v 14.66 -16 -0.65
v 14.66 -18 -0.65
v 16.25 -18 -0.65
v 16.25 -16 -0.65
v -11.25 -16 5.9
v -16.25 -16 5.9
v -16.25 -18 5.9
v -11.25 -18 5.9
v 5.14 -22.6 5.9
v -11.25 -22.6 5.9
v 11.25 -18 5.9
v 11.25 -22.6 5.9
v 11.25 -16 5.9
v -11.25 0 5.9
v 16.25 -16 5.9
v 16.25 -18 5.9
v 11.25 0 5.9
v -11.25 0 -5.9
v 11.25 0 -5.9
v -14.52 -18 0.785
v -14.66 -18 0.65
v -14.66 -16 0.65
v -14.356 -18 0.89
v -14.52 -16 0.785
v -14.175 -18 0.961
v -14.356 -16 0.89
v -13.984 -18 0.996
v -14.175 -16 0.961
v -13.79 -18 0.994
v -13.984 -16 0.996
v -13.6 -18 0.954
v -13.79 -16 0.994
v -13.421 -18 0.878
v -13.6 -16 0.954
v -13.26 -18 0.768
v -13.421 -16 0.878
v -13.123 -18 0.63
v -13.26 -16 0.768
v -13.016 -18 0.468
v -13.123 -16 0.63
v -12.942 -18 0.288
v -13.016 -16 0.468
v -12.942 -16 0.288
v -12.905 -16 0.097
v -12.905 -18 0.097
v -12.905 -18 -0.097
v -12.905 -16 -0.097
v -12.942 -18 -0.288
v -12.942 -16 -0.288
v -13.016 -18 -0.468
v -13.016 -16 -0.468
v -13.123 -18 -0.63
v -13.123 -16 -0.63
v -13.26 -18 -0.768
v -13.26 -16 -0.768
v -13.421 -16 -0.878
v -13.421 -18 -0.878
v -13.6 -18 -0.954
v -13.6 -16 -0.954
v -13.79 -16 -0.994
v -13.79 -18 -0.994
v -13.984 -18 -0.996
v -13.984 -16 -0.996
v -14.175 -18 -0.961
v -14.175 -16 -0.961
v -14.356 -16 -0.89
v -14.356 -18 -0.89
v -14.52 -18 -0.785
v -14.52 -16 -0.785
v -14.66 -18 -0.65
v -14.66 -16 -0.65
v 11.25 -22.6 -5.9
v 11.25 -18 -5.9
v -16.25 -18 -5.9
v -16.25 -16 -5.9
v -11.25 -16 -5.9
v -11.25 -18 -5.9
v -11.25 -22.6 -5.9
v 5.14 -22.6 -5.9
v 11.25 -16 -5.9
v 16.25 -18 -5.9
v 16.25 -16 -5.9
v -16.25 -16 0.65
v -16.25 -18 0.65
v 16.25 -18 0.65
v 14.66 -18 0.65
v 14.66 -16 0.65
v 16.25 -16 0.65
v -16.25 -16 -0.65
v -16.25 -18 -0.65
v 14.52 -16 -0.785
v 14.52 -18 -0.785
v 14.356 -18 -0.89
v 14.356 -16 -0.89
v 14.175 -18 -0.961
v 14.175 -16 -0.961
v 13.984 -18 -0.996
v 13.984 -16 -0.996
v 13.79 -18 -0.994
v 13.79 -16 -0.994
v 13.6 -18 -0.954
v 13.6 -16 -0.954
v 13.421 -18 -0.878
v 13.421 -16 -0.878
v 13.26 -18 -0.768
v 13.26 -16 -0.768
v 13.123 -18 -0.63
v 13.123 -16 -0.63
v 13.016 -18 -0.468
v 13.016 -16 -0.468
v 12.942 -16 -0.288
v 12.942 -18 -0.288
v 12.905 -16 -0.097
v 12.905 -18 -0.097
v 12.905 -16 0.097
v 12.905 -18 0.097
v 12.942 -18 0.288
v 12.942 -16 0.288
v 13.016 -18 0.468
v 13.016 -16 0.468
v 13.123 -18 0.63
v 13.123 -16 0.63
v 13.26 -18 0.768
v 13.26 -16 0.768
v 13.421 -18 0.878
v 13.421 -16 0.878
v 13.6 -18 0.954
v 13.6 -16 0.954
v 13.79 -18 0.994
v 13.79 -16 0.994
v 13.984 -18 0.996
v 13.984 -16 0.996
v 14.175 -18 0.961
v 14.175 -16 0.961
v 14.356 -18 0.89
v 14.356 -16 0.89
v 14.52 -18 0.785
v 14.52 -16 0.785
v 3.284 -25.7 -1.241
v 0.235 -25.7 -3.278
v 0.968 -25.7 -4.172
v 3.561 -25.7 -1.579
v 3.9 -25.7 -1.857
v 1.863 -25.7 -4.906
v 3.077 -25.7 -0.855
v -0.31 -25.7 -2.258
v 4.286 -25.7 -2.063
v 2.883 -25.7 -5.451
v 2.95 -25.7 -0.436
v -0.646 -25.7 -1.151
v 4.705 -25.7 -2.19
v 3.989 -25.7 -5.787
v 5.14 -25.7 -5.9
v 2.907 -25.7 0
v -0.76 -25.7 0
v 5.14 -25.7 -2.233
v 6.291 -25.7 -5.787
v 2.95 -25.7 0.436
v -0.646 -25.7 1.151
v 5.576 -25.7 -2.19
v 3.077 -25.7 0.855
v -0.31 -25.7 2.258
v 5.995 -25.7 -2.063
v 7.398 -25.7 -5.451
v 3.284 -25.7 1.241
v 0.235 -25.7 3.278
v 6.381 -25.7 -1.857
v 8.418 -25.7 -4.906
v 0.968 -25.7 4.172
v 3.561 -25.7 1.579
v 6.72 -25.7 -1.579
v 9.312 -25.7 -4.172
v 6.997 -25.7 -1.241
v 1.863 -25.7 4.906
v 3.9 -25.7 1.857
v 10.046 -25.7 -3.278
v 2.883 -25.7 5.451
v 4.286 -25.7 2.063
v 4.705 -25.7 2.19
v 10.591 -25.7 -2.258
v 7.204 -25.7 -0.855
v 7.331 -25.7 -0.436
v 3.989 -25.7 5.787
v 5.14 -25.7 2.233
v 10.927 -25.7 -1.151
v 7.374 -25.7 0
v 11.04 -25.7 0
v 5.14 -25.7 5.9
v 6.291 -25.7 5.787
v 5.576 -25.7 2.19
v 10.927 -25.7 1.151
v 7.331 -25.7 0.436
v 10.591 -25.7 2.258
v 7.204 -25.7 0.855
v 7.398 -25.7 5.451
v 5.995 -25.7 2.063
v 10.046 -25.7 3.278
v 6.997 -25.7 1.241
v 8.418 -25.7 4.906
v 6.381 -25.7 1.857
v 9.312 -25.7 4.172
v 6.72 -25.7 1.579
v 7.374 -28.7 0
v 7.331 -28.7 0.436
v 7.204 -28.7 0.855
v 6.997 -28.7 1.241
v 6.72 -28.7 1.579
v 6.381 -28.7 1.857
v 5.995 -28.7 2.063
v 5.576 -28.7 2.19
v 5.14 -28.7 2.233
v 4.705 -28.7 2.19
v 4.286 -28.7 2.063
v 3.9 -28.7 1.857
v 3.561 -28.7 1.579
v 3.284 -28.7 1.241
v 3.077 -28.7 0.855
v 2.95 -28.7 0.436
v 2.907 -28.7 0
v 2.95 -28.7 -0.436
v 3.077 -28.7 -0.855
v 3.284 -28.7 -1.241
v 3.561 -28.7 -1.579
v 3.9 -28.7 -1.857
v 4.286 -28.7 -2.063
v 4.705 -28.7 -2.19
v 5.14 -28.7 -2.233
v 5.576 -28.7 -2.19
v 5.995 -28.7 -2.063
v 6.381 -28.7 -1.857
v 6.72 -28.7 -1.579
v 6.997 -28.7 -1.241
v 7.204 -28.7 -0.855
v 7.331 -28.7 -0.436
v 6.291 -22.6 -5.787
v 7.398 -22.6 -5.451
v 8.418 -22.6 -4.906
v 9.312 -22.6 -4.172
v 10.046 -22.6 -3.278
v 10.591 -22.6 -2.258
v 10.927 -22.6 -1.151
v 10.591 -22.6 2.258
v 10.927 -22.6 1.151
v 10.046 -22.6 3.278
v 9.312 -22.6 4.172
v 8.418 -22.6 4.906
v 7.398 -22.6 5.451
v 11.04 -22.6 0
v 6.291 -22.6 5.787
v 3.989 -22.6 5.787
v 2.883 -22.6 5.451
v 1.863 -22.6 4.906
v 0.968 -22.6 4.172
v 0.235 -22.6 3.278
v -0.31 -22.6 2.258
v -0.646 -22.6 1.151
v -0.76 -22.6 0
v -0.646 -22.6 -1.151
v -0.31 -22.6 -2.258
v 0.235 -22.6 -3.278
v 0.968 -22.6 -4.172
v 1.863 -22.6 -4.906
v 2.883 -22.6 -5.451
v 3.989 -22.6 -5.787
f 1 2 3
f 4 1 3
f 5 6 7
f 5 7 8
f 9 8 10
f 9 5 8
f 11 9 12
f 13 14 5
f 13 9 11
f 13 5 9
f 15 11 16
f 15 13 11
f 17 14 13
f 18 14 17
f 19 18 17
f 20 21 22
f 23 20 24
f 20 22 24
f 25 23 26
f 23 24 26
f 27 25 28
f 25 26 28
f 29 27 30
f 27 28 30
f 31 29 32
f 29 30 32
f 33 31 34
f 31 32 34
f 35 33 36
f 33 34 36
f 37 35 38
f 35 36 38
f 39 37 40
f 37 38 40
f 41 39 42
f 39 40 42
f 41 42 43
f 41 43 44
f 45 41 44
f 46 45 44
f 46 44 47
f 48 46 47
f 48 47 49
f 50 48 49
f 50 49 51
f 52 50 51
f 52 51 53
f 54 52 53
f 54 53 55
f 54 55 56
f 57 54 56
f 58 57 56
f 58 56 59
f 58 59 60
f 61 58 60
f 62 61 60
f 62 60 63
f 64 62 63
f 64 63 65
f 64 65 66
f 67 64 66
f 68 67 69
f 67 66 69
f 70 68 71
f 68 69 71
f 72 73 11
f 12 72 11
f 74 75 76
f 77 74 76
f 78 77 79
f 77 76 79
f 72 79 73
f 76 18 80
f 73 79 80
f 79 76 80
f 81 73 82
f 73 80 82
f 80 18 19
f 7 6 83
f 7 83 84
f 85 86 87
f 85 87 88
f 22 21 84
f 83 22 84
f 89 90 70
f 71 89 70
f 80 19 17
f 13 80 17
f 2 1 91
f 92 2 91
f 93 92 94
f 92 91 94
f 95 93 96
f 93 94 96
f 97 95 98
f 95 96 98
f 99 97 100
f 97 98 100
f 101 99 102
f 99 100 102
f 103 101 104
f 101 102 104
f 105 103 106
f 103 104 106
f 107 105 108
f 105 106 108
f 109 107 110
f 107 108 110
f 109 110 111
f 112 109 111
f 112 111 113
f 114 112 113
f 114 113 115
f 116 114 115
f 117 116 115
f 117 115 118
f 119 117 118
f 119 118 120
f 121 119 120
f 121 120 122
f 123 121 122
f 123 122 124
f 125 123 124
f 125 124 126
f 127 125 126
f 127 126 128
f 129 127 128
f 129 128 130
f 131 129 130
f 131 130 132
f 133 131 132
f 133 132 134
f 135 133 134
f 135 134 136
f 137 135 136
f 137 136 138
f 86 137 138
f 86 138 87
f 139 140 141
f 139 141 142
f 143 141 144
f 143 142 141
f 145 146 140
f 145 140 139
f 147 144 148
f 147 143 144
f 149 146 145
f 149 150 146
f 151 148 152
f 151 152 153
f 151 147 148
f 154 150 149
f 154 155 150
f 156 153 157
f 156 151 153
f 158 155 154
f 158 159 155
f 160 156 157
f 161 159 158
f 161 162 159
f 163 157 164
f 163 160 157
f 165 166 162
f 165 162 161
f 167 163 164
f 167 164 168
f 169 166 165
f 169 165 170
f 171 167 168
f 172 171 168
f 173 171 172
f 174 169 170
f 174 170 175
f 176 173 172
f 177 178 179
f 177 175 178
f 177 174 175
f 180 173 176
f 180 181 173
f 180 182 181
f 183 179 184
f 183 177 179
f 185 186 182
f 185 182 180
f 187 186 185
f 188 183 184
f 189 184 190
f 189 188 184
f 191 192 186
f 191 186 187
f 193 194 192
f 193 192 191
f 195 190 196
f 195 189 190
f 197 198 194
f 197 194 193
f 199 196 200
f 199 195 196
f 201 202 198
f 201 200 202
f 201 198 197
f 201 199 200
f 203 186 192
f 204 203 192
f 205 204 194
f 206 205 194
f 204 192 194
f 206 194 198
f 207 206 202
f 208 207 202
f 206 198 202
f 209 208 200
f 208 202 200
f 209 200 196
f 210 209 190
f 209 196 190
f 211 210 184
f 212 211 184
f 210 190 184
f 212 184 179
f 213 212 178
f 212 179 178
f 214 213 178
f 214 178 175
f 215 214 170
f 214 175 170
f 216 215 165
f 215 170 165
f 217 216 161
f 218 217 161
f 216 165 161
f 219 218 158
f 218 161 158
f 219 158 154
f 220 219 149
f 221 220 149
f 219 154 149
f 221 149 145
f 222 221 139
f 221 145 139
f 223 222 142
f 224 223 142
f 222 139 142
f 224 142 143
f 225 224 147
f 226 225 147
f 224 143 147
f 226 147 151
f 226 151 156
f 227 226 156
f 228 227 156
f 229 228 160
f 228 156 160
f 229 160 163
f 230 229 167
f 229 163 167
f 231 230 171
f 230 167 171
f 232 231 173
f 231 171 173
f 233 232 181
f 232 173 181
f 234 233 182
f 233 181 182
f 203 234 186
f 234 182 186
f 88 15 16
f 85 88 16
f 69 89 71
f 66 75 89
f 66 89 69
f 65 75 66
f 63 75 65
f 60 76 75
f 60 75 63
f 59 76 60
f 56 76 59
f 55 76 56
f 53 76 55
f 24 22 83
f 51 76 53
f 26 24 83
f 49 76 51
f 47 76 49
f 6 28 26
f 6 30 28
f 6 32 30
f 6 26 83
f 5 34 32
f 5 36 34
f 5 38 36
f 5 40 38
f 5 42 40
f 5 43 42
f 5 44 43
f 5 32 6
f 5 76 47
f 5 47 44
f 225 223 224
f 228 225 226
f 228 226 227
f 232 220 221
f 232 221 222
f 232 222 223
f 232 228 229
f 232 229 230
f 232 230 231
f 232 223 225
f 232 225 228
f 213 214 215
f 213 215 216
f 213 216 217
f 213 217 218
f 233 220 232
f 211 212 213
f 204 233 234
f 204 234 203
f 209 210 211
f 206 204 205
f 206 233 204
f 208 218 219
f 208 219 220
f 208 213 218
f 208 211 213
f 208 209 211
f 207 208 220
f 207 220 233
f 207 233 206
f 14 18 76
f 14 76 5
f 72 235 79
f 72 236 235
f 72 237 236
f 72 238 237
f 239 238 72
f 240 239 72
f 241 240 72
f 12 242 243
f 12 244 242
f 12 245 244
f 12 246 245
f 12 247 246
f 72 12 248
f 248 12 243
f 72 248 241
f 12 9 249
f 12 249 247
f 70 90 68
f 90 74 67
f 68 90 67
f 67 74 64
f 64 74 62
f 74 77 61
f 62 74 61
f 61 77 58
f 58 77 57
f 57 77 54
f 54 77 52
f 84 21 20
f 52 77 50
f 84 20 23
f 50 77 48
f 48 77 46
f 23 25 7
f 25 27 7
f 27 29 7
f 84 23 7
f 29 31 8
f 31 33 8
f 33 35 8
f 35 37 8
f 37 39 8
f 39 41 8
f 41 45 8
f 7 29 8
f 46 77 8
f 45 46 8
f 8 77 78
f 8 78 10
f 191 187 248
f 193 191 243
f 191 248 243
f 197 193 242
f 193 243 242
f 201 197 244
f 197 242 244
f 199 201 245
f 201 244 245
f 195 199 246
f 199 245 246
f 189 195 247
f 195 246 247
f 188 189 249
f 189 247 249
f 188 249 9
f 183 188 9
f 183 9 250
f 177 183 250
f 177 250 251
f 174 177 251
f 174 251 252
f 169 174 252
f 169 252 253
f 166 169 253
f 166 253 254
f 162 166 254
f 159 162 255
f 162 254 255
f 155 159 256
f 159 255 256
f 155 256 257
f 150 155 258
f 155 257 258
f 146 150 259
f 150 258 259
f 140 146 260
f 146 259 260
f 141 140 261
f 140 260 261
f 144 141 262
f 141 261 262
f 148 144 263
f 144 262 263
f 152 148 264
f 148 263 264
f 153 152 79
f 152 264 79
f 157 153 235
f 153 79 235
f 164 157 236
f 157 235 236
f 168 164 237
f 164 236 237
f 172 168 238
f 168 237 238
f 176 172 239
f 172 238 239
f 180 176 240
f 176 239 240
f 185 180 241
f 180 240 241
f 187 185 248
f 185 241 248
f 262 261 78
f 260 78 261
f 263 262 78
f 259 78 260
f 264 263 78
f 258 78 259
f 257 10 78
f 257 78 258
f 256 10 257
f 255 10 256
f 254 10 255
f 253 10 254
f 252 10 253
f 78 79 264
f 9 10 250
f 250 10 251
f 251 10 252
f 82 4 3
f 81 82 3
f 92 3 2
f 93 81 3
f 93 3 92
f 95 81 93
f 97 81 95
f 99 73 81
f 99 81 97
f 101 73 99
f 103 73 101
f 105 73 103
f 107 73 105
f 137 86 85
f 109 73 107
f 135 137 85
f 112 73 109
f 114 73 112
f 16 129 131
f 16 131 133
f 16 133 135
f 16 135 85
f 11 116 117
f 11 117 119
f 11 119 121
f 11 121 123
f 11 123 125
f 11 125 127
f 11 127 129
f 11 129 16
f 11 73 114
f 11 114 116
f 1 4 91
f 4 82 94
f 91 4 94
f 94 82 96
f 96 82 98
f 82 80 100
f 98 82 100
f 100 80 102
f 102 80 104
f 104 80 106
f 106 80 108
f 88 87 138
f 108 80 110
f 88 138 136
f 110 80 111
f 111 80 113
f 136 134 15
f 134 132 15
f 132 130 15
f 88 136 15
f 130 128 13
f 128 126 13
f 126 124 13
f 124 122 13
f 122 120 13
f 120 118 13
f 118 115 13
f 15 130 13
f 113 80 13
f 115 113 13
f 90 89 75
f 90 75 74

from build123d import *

# Parameters (mm, degrees)
F0_W          = 22.5
F0_H          = 11.8
F1_DEPTH      = 22.6
F2_W          = 2
F2_H          = 11.8
F3_DEPTH      = 5
F3_DEPTH_BACK = 27.5
F4_R          = 5.9
F5_DEPTH      = 3.1
F6_R          = 2.2332329477
F7_DEPTH      = 3
F9_D          = 2
F9_DEPTH      = 12
F9_TIP        = 0.600860619
F10_W         = 7.0652620957
F10_H         = 1.3
F10_W_2       = 9.383104834
F11_DEPTH     = 5


with BuildPart() as f1:
    # F0 (on Front) → F1 (new body)
    with BuildSketch(Plane.XZ):
        Rectangle(F0_W, F0_H)
    extrude(amount=F1_DEPTH)

    # F2 (on face) → F3 (join, two sides)
    with BuildSketch(Plane(origin=(-11.25, 0, 0), x_dir=(0, -1, 0), z_dir=(-1, 0, 0))) as f3_sk:
        with Locations((17, 0)):
            Rectangle(F2_W, F2_H)
    extrude(amount=F3_DEPTH)
    extrude(f3_sk.sketch, amount=-F3_DEPTH_BACK)

    # F4 (on face) → F5 (join)
    with BuildSketch(Plane.XZ.offset(22.6)):
        with Locations((5.1404135302, 0)):
            Circle(F4_R)
    extrude(amount=F5_DEPTH)

    # F6 (on face) → F7 (join)
    with BuildSketch(Plane.XZ.offset(25.7)):
        with Locations((5.1404135302, 0)):
            Circle(F6_R)
    extrude(amount=F7_DEPTH)

    # F9
    with Locations(Plane.XZ.offset(18)):
        with Locations((-13.9, 0), (13.9, 0)):
            Hole(F9_D / 2, depth=F9_DEPTH)
            with Locations((0, 0, -(F9_DEPTH + F9_TIP / 2))):  # 118° drill point
                Cone(0, F9_D / 2, F9_TIP, mode=Mode.SUBTRACT)

    # F10 (on face) → F11 (cut)
    with BuildSketch(Plane.XZ.offset(18)):
        with Locations((-19.7826310478, 0)):
            Rectangle(F10_W, F10_H)
        with BuildLine():
            ThreePointArc((-14.6599342077, -0.65), (-14.9, 0), (-14.6599342077, 0.65))
            Line((-14.6599342077, 0.65), (-16.25, 0.65))
            Line((-16.25, 0.65), (-16.25, -0.65))
            Line((-16.25, -0.65), (-14.6599342077, -0.65))
        make_face()
        with BuildLine():
            Line((-13.9321572616, -0.65), (-13.9321572616, 0.65))
            Line((-13.9321572616, 0.65), (-14.6599342077, 0.65))
            ThreePointArc((-14.6599342077, 0.65), (-14.9, 0), (-14.6599342077, -0.65))
            Line((-14.6599342077, -0.65), (-13.9321572616, -0.65))
        make_face()
        with Locations((18.763743341, 0)):
            Rectangle(F10_W_2, F10_H)
    extrude(amount=-F11_DEPTH, mode=Mode.SUBTRACT)


solid = f1.part
